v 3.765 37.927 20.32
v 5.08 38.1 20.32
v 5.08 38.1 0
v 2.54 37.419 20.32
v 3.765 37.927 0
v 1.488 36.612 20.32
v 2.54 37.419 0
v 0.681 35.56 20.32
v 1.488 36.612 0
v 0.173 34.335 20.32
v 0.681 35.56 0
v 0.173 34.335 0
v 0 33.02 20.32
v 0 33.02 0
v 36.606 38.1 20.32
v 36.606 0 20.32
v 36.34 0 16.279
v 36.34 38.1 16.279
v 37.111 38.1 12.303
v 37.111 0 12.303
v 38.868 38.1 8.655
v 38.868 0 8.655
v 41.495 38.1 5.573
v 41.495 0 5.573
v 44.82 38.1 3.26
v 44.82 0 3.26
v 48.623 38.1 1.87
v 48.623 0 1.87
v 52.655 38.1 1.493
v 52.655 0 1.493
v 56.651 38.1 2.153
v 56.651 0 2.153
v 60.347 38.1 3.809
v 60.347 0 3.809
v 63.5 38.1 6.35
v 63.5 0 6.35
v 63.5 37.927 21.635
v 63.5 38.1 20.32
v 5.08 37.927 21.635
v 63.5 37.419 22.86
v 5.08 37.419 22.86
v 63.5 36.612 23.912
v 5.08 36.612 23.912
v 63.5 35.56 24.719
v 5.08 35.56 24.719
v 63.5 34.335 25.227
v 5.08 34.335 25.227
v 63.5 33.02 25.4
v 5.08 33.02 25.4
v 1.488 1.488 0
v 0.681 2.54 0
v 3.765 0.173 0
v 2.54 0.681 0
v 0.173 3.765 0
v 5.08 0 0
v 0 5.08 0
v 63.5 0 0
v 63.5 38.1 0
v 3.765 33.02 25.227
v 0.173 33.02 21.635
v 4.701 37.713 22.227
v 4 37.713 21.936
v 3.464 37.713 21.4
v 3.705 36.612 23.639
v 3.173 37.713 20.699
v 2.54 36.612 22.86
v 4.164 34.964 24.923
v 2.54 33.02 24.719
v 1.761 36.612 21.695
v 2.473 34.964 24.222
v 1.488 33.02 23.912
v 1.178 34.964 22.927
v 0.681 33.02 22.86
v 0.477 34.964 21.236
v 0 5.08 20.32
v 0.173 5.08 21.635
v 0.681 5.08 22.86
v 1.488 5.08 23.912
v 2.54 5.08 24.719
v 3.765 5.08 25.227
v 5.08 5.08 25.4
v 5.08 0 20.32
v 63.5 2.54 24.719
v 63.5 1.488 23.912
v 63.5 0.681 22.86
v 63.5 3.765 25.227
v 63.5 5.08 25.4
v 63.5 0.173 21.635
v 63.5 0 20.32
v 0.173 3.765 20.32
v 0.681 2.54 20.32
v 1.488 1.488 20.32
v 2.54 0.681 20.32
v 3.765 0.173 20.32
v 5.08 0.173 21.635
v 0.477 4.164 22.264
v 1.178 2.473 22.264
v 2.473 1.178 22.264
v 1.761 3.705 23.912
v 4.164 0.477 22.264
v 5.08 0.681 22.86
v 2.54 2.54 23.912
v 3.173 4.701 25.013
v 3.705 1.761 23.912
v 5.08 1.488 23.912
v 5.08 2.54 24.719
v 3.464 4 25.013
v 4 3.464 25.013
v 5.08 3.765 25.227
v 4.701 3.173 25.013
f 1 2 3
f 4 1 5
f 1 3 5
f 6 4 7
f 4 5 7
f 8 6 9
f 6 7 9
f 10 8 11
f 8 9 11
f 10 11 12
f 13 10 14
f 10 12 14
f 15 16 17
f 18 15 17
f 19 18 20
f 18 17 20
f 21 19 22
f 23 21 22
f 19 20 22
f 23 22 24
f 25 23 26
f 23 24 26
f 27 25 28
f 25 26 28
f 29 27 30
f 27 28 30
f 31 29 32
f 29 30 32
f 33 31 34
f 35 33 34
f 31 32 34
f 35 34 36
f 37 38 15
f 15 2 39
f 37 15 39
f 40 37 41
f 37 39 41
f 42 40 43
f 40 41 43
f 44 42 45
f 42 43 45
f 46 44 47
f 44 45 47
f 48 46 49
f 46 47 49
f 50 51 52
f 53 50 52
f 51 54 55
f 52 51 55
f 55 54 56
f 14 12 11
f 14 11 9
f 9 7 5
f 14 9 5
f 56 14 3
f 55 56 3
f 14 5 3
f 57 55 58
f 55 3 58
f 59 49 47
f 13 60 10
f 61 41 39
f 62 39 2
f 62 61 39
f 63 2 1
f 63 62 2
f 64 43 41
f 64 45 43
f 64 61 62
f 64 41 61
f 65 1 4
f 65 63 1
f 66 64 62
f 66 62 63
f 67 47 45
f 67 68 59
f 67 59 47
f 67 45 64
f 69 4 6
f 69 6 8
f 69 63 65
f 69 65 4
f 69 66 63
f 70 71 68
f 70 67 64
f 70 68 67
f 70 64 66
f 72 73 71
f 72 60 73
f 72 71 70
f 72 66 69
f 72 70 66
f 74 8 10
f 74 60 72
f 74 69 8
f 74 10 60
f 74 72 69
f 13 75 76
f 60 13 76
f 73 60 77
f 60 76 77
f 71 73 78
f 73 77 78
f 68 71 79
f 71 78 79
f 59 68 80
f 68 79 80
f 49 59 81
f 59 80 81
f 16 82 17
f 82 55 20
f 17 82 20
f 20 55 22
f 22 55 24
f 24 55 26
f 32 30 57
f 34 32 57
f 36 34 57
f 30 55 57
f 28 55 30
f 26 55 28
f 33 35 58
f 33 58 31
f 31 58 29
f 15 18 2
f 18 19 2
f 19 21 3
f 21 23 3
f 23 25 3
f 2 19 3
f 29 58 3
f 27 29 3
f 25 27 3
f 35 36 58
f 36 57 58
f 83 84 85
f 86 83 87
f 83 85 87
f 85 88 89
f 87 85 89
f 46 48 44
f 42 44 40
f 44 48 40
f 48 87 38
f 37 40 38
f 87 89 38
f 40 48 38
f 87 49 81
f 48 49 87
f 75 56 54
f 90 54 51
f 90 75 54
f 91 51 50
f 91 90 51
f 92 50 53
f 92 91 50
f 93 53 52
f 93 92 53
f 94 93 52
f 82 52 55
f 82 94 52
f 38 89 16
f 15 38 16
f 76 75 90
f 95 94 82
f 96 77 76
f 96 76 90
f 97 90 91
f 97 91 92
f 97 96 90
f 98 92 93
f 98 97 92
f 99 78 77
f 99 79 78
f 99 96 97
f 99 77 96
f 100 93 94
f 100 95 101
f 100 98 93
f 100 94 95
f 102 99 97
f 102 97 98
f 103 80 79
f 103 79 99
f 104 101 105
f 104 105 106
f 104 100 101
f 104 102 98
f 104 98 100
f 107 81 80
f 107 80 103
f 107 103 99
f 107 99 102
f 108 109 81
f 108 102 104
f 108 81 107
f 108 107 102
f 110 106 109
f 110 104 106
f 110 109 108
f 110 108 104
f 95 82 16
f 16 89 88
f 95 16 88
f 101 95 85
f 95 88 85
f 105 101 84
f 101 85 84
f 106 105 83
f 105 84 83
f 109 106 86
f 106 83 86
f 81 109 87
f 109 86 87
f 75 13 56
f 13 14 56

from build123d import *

# Parameters (mm, degrees)
F1_DEPTH = 25.4
F2_R     = 5.08
F3_R     = 5.08
F4_R     = 5.08
F6_DEPTH = 41.656


with BuildPart() as f1:
    # F0 (on Top) → F1 (new body)
    with BuildSketch(Plane.XY):
        Polygon((0, 38.1), (0, 0), (63.5, 0), (63.5, 38.1), (50.8, 38.1), (12.7, 38.1), align=None)
    extrude(amount=F1_DEPTH)

    # F2
    f2_edges = [f1.edges().sort_by_distance(p)[0] for p in [
        (0, 0, 12.7),
    ]]
    fillet(f2_edges, radius=F2_R)

    # F3
    f3_edges = [f1.edges().sort_by_distance(p)[0] for p in [
        (1.487898, 1.487898, 25.4),
    ]]
    fillet(f3_edges, radius=F3_R)

    # F4
    f4_edges = [f1.edges().sort_by_distance(p)[0] for p in [
        (34.29, 38.1, 25.4),
    ]]
    fillet(f4_edges, radius=F4_R)

    # F5 (on face) → F6 (cut)
    with BuildSketch(Plane.XZ):
        with BuildLine():
            Line((63.5, 20.32), (36.6062117726, 20.32))
            ThreePointArc((36.6062117726, 20.32), (44.8198393028, 3.2603855953), (63.5, 6.35))
            Line((63.5, 6.35), (63.5, 20.32))
        make_face()
    extrude(amount=-F6_DEPTH, mode=Mode.SUBTRACT)


solid = f1.part
